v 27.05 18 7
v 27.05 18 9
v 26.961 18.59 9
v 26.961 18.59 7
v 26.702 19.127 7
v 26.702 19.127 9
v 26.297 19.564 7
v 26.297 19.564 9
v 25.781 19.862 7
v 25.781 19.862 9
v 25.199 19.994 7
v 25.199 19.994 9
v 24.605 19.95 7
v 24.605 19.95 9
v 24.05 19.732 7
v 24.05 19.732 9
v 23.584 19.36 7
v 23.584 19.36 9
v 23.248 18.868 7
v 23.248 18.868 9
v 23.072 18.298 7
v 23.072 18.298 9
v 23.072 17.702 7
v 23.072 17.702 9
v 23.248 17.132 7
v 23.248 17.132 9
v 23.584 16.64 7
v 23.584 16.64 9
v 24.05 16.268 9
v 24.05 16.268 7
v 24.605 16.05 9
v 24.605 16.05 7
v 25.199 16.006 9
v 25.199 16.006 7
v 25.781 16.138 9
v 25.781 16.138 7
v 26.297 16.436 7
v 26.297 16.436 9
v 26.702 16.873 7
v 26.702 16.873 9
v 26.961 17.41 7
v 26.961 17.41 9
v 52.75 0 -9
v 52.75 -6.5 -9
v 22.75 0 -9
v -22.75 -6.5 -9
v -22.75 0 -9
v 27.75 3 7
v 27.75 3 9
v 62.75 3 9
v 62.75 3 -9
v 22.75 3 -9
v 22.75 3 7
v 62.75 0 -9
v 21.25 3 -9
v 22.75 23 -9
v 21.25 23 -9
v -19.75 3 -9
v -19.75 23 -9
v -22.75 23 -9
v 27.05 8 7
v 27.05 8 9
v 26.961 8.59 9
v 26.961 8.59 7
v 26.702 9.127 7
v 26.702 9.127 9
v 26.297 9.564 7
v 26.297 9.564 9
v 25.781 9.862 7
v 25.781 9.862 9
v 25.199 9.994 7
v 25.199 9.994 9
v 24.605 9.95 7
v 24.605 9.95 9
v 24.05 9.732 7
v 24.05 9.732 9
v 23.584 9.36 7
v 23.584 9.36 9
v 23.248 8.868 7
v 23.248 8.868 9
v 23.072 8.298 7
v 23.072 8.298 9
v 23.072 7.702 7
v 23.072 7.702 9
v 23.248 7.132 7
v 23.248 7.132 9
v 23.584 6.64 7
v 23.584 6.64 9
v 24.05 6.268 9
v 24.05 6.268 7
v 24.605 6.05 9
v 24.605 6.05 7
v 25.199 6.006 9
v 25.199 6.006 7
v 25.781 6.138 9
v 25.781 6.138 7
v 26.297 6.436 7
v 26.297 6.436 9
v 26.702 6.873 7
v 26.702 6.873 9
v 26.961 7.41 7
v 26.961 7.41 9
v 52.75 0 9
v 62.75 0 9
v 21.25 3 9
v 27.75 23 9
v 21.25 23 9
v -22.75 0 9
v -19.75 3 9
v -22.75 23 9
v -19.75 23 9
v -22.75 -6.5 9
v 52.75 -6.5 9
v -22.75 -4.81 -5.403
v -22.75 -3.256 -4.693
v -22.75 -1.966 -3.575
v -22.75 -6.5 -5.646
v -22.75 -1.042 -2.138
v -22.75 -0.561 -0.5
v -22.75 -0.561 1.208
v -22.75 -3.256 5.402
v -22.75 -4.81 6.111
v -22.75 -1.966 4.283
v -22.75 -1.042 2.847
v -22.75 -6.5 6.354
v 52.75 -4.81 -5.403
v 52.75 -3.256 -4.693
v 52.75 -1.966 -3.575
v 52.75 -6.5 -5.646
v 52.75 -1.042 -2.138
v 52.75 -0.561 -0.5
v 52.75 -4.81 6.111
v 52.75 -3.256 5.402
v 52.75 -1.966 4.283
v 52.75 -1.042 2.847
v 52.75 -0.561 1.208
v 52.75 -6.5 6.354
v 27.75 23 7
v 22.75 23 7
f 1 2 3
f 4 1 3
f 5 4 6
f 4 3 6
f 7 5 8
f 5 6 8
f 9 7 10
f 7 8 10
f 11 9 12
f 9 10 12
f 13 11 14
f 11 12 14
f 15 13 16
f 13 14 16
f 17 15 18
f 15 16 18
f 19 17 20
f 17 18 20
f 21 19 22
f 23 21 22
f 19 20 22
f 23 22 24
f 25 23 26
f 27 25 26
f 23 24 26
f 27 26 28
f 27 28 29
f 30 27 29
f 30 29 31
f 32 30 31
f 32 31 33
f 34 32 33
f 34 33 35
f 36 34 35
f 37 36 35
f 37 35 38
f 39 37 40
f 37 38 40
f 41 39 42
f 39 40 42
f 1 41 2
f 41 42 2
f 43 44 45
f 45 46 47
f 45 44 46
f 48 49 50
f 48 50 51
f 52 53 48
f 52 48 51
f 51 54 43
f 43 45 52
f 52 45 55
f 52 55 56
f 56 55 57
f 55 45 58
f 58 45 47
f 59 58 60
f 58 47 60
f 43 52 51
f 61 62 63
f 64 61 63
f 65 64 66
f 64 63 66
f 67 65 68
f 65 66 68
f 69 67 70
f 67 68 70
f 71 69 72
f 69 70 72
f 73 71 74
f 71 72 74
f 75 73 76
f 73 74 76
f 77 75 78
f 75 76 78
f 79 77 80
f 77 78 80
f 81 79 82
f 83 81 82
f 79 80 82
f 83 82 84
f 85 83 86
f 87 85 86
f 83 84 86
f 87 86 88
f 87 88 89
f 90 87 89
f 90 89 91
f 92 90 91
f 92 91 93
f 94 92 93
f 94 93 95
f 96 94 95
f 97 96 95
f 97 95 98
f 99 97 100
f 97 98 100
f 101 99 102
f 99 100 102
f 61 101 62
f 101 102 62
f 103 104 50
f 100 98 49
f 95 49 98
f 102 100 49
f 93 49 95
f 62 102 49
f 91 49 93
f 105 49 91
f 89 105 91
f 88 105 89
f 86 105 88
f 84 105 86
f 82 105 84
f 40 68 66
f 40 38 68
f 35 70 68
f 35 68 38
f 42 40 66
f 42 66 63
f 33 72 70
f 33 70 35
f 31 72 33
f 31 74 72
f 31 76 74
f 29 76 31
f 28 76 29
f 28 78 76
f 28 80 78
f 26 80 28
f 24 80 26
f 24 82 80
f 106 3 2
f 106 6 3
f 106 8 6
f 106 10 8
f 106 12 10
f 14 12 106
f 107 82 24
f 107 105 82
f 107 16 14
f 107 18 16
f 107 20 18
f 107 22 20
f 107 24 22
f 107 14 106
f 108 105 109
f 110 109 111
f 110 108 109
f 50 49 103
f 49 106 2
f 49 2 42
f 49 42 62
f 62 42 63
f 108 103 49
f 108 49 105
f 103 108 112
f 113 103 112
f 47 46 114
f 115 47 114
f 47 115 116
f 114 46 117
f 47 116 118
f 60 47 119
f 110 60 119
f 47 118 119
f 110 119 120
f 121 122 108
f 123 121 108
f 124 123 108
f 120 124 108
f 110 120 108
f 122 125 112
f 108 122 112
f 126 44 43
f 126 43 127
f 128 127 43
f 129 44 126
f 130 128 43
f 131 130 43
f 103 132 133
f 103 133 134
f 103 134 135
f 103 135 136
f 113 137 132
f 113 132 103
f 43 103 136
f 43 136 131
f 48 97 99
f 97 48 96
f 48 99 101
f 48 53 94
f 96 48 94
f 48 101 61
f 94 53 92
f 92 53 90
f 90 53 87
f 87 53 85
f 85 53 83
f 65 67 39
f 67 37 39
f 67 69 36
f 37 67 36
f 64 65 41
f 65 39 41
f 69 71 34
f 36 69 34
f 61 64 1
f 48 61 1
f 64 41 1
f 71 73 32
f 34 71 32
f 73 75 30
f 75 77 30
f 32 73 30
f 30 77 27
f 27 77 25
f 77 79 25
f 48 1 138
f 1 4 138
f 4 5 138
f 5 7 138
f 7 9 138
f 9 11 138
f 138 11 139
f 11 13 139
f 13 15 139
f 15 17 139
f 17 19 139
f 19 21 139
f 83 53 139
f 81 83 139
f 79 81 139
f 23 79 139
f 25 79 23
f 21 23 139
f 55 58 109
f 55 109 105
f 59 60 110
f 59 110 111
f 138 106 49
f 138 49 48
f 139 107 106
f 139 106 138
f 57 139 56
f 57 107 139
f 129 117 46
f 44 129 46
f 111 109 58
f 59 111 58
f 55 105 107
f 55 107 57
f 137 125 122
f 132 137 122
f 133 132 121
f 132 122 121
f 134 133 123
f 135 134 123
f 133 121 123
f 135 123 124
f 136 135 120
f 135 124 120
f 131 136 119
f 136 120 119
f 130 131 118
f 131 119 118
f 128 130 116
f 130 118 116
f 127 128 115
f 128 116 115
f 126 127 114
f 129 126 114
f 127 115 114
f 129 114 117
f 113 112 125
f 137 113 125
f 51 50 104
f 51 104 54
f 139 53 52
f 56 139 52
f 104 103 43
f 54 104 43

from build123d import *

# Parameters (mm, degrees)
SKETCH1_W            = 45.5
SKETCH1_H            = 18
BOSS_EXTRUDE1_DEPTH  = 3
SKETCH2_W            = 3
SKETCH2_H            = 18
SKETCH2_W_2          = 1.5
BOSS_EXTRUDE2_DEPTH  = 20
SKETCH6_W            = 2
SKETCH6_H            = 20
BOSS_EXTRUDE5_DEPTH  = 5
SKETCH7_R            = 2
CUT_EXTRUDE2_DEPTH   = 2
BOSS_EXTRUDE9_DEPTH  = 75.5
SKETCH9_W            = 18
SKETCH9_H            = 3
BOSS_EXTRUDE10_DEPTH = 40


with BuildPart() as part:
    # Sketch1 → Boss-Extrude1 (new body)
    with BuildSketch(Plane(origin=(0, 0, 0), x_dir=(1, 0, 0), z_dir=(0, 1, 0))):
        Rectangle(SKETCH1_W, SKETCH1_H)
    extrude(amount=BOSS_EXTRUDE1_DEPTH)

    # Sketch2 → Boss-Extrude2 (add)
    with BuildSketch(Plane(origin=(0, 3, 0), x_dir=(1, 0, 0), z_dir=(0, 1, 0))):
        with Locations((-21.25, 0)):
            Rectangle(SKETCH2_W, SKETCH2_H)
        with Locations((22, 0)):
            Rectangle(SKETCH2_W_2, SKETCH2_H)
    extrude(amount=BOSS_EXTRUDE2_DEPTH)

    # Sketch6 → Boss-Extrude5 (add)
    with BuildSketch(Plane(origin=(22.75, 0, 0), x_dir=(0, 0, -1), z_dir=(1, 0, 0))):
        with Locations((-8, 13)):
            Rectangle(SKETCH6_W, SKETCH6_H)
    extrude(amount=BOSS_EXTRUDE5_DEPTH)

    # Sketch7 → Cut-Extrude2 (cut)
    with BuildSketch(Plane.XY.offset(9)):
        with Locations((25.05, 8)):
            Circle(SKETCH7_R)
        with Locations((25.05, 18)):
            Circle(SKETCH7_R)
    extrude(amount=-CUT_EXTRUDE2_DEPTH, mode=Mode.SUBTRACT)

    # 3DSketch1 → Boss-Extrude9 (add)
    with BuildSketch(Plane(origin=(-22.75, 0, 9), x_dir=(0, -0.3396444637775567, -0.9405538996916956), z_dir=(-1, 0, 0))):
        with BuildLine():
            Line((0, 0), (2.207689015, 6.113600348))
            Line((2.207689015, 6.113600348), (4.696214266, 5.214966229))
            ThreePointArc((4.696214266, 5.214966229), (8.301670881, -2.466223951), (15.982861062, 1.139232664))
            Line((15.982861062, 1.139232664), (19.137659209, 0))
            Line((19.137659209, 0), (16.929970194, -6.113600348))
            Line((16.929970194, -6.113600348), (0, 0))
        make_face()
    extrude(amount=-BOSS_EXTRUDE9_DEPTH)

    # Sketch9 → Boss-Extrude10 (add)
    with BuildSketch(Plane(origin=(22.75, 0, 0), x_dir=(0, 0, -1), z_dir=(1, 0, 0))):
        with Locations((0, 1.5)):
            Rectangle(SKETCH9_W, SKETCH9_H)
    extrude(amount=BOSS_EXTRUDE10_DEPTH)


solid = part.part
